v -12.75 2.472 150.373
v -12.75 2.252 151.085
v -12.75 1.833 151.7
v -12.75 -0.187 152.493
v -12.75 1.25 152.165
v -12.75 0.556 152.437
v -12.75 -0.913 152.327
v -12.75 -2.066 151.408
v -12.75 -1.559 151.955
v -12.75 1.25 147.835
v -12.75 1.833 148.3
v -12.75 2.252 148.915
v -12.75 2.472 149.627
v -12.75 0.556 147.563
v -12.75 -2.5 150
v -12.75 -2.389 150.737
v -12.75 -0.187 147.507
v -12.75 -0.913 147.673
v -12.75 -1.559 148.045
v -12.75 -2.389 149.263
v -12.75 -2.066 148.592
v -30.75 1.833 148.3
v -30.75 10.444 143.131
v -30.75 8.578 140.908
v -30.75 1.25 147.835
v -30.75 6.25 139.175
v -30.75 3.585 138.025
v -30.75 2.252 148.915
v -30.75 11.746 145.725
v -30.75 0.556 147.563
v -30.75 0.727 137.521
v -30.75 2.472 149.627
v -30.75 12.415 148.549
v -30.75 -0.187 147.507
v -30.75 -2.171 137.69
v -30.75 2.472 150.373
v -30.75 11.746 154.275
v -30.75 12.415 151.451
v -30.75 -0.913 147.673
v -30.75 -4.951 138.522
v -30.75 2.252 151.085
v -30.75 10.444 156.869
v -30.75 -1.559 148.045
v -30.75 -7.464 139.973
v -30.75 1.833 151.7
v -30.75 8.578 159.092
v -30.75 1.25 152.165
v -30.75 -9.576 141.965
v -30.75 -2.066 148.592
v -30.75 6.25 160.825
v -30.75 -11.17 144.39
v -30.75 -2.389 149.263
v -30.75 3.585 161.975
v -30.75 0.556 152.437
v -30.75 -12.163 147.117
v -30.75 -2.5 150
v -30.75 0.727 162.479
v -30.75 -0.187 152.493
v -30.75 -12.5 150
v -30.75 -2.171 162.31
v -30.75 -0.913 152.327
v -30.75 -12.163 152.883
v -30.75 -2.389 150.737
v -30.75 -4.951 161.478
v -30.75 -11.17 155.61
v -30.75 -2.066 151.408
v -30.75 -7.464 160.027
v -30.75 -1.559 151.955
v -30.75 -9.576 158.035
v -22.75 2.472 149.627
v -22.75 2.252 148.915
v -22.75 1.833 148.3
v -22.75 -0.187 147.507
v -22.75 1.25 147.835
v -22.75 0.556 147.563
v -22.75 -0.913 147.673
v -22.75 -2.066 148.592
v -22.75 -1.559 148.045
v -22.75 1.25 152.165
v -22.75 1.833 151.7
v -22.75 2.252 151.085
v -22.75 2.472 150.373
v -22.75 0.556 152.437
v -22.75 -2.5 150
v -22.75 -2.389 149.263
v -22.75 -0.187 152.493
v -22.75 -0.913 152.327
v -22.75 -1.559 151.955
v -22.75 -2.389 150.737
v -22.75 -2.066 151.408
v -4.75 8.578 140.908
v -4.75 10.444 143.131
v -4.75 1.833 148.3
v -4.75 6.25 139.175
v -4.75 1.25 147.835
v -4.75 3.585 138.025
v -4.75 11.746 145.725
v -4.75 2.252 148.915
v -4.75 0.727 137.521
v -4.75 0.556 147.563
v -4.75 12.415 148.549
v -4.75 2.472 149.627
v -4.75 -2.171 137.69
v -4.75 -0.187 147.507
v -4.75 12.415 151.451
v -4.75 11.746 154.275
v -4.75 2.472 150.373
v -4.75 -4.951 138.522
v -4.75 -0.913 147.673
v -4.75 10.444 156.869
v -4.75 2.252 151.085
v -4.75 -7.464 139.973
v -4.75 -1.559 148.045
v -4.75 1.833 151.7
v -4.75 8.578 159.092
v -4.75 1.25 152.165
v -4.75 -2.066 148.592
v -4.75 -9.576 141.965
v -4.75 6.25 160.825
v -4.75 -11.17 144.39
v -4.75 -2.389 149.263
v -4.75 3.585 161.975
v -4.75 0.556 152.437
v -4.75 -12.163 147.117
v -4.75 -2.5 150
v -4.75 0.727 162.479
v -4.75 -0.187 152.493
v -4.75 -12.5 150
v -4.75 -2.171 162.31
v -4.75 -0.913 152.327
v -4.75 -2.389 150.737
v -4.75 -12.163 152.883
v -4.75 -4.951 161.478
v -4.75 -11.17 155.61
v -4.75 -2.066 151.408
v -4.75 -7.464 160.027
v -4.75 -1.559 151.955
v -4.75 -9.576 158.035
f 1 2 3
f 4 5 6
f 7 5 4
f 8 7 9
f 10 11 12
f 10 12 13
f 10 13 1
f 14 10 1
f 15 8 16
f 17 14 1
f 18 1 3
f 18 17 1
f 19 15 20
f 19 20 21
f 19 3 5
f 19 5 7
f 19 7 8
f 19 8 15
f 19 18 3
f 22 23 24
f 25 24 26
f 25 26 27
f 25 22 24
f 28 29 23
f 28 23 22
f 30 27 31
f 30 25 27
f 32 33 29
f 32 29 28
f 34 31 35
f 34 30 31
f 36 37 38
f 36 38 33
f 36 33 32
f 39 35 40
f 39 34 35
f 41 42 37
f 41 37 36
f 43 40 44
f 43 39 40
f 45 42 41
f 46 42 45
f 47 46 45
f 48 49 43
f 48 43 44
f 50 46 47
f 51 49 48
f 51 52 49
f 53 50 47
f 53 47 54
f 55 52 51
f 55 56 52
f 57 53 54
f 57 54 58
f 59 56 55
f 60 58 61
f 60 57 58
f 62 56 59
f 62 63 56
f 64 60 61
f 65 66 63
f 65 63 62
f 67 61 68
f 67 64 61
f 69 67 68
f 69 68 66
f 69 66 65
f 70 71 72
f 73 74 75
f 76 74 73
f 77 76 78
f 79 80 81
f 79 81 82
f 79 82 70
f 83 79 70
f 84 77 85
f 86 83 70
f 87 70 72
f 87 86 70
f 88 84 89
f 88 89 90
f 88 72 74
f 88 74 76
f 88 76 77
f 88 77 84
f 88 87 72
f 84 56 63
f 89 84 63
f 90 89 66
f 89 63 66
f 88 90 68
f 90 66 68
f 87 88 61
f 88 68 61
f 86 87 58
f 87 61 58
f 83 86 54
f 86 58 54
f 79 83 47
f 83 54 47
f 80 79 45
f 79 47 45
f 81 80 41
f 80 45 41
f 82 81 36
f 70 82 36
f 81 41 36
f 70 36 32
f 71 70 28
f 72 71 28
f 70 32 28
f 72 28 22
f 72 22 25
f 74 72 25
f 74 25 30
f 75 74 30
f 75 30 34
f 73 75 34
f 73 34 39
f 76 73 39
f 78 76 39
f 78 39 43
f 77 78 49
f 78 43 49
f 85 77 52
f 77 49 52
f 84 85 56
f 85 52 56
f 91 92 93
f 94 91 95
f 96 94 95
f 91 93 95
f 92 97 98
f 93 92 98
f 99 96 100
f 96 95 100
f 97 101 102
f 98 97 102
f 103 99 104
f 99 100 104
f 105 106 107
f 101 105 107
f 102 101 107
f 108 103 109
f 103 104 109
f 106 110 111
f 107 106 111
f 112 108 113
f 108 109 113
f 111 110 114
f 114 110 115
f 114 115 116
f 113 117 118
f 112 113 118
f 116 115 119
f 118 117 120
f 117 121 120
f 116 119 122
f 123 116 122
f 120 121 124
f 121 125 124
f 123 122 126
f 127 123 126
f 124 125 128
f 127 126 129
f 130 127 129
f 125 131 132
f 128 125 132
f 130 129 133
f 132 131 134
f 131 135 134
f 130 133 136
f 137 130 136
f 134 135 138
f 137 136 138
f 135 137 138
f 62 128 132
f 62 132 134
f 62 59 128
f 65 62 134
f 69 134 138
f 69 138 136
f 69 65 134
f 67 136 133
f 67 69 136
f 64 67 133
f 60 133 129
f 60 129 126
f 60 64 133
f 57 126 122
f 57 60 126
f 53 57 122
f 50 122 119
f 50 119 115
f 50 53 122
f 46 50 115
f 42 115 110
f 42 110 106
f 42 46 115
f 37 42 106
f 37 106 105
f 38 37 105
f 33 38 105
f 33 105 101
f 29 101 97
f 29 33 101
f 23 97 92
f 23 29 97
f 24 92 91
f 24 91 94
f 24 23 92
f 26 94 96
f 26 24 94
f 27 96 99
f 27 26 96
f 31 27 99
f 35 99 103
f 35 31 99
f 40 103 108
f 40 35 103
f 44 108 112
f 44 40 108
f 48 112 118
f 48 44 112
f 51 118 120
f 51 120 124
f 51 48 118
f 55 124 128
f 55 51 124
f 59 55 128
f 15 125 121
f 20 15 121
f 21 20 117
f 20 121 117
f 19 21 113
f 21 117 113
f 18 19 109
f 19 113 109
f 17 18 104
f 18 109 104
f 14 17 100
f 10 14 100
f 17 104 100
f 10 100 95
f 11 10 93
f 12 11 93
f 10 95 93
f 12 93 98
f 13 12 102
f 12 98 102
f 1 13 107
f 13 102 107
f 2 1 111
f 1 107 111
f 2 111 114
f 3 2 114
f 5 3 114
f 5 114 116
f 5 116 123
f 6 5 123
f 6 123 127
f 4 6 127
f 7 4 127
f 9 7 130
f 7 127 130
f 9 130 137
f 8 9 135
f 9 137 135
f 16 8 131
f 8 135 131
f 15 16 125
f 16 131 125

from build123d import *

# Parameters (mm, degrees)
SKETCH051_R             = 12.5
PAD018_DEPTH            = 13
SKETCH055_R             = 2.5
POCKET030_DEPTH         = 8
SKETCH056_R             = 2.5
POCKET029_DEPTH         = 8
BODY013_PLACEMENT_ANGLE = -90


with BuildPart() as part:
    # Sketch051 → Pad018 (new body, symmetric)
    with BuildSketch(Plane.XZ):
        Circle(SKETCH051_R)
    extrude(amount=PAD018_DEPTH, both=True)

    # Sketch055 (on Face3 of Pad018) → Pocket030 (cut)
    with BuildSketch(Plane.XZ.offset(13)):
        Circle(SKETCH055_R)
    extrude(amount=-POCKET030_DEPTH, mode=Mode.SUBTRACT)

    # Sketch056 (on Face2 of Pocket030) → Pocket029 (cut)
    with BuildSketch(Plane(origin=(0, 13, 0), x_dir=(1, 0, 0), z_dir=(0, 1, 0))):
        Circle(SKETCH056_R)
    extrude(amount=-POCKET029_DEPTH, mode=Mode.SUBTRACT)


with BuildPart() as part_1:
    # Body013 placement: moved
    add(part.part.moved(Location((-17.75, 0, 150))).rotate(Axis((-17.75, 0, 150), (0, 0, 1)), BODY013_PLACEMENT_ANGLE))


solid = part_1.part
